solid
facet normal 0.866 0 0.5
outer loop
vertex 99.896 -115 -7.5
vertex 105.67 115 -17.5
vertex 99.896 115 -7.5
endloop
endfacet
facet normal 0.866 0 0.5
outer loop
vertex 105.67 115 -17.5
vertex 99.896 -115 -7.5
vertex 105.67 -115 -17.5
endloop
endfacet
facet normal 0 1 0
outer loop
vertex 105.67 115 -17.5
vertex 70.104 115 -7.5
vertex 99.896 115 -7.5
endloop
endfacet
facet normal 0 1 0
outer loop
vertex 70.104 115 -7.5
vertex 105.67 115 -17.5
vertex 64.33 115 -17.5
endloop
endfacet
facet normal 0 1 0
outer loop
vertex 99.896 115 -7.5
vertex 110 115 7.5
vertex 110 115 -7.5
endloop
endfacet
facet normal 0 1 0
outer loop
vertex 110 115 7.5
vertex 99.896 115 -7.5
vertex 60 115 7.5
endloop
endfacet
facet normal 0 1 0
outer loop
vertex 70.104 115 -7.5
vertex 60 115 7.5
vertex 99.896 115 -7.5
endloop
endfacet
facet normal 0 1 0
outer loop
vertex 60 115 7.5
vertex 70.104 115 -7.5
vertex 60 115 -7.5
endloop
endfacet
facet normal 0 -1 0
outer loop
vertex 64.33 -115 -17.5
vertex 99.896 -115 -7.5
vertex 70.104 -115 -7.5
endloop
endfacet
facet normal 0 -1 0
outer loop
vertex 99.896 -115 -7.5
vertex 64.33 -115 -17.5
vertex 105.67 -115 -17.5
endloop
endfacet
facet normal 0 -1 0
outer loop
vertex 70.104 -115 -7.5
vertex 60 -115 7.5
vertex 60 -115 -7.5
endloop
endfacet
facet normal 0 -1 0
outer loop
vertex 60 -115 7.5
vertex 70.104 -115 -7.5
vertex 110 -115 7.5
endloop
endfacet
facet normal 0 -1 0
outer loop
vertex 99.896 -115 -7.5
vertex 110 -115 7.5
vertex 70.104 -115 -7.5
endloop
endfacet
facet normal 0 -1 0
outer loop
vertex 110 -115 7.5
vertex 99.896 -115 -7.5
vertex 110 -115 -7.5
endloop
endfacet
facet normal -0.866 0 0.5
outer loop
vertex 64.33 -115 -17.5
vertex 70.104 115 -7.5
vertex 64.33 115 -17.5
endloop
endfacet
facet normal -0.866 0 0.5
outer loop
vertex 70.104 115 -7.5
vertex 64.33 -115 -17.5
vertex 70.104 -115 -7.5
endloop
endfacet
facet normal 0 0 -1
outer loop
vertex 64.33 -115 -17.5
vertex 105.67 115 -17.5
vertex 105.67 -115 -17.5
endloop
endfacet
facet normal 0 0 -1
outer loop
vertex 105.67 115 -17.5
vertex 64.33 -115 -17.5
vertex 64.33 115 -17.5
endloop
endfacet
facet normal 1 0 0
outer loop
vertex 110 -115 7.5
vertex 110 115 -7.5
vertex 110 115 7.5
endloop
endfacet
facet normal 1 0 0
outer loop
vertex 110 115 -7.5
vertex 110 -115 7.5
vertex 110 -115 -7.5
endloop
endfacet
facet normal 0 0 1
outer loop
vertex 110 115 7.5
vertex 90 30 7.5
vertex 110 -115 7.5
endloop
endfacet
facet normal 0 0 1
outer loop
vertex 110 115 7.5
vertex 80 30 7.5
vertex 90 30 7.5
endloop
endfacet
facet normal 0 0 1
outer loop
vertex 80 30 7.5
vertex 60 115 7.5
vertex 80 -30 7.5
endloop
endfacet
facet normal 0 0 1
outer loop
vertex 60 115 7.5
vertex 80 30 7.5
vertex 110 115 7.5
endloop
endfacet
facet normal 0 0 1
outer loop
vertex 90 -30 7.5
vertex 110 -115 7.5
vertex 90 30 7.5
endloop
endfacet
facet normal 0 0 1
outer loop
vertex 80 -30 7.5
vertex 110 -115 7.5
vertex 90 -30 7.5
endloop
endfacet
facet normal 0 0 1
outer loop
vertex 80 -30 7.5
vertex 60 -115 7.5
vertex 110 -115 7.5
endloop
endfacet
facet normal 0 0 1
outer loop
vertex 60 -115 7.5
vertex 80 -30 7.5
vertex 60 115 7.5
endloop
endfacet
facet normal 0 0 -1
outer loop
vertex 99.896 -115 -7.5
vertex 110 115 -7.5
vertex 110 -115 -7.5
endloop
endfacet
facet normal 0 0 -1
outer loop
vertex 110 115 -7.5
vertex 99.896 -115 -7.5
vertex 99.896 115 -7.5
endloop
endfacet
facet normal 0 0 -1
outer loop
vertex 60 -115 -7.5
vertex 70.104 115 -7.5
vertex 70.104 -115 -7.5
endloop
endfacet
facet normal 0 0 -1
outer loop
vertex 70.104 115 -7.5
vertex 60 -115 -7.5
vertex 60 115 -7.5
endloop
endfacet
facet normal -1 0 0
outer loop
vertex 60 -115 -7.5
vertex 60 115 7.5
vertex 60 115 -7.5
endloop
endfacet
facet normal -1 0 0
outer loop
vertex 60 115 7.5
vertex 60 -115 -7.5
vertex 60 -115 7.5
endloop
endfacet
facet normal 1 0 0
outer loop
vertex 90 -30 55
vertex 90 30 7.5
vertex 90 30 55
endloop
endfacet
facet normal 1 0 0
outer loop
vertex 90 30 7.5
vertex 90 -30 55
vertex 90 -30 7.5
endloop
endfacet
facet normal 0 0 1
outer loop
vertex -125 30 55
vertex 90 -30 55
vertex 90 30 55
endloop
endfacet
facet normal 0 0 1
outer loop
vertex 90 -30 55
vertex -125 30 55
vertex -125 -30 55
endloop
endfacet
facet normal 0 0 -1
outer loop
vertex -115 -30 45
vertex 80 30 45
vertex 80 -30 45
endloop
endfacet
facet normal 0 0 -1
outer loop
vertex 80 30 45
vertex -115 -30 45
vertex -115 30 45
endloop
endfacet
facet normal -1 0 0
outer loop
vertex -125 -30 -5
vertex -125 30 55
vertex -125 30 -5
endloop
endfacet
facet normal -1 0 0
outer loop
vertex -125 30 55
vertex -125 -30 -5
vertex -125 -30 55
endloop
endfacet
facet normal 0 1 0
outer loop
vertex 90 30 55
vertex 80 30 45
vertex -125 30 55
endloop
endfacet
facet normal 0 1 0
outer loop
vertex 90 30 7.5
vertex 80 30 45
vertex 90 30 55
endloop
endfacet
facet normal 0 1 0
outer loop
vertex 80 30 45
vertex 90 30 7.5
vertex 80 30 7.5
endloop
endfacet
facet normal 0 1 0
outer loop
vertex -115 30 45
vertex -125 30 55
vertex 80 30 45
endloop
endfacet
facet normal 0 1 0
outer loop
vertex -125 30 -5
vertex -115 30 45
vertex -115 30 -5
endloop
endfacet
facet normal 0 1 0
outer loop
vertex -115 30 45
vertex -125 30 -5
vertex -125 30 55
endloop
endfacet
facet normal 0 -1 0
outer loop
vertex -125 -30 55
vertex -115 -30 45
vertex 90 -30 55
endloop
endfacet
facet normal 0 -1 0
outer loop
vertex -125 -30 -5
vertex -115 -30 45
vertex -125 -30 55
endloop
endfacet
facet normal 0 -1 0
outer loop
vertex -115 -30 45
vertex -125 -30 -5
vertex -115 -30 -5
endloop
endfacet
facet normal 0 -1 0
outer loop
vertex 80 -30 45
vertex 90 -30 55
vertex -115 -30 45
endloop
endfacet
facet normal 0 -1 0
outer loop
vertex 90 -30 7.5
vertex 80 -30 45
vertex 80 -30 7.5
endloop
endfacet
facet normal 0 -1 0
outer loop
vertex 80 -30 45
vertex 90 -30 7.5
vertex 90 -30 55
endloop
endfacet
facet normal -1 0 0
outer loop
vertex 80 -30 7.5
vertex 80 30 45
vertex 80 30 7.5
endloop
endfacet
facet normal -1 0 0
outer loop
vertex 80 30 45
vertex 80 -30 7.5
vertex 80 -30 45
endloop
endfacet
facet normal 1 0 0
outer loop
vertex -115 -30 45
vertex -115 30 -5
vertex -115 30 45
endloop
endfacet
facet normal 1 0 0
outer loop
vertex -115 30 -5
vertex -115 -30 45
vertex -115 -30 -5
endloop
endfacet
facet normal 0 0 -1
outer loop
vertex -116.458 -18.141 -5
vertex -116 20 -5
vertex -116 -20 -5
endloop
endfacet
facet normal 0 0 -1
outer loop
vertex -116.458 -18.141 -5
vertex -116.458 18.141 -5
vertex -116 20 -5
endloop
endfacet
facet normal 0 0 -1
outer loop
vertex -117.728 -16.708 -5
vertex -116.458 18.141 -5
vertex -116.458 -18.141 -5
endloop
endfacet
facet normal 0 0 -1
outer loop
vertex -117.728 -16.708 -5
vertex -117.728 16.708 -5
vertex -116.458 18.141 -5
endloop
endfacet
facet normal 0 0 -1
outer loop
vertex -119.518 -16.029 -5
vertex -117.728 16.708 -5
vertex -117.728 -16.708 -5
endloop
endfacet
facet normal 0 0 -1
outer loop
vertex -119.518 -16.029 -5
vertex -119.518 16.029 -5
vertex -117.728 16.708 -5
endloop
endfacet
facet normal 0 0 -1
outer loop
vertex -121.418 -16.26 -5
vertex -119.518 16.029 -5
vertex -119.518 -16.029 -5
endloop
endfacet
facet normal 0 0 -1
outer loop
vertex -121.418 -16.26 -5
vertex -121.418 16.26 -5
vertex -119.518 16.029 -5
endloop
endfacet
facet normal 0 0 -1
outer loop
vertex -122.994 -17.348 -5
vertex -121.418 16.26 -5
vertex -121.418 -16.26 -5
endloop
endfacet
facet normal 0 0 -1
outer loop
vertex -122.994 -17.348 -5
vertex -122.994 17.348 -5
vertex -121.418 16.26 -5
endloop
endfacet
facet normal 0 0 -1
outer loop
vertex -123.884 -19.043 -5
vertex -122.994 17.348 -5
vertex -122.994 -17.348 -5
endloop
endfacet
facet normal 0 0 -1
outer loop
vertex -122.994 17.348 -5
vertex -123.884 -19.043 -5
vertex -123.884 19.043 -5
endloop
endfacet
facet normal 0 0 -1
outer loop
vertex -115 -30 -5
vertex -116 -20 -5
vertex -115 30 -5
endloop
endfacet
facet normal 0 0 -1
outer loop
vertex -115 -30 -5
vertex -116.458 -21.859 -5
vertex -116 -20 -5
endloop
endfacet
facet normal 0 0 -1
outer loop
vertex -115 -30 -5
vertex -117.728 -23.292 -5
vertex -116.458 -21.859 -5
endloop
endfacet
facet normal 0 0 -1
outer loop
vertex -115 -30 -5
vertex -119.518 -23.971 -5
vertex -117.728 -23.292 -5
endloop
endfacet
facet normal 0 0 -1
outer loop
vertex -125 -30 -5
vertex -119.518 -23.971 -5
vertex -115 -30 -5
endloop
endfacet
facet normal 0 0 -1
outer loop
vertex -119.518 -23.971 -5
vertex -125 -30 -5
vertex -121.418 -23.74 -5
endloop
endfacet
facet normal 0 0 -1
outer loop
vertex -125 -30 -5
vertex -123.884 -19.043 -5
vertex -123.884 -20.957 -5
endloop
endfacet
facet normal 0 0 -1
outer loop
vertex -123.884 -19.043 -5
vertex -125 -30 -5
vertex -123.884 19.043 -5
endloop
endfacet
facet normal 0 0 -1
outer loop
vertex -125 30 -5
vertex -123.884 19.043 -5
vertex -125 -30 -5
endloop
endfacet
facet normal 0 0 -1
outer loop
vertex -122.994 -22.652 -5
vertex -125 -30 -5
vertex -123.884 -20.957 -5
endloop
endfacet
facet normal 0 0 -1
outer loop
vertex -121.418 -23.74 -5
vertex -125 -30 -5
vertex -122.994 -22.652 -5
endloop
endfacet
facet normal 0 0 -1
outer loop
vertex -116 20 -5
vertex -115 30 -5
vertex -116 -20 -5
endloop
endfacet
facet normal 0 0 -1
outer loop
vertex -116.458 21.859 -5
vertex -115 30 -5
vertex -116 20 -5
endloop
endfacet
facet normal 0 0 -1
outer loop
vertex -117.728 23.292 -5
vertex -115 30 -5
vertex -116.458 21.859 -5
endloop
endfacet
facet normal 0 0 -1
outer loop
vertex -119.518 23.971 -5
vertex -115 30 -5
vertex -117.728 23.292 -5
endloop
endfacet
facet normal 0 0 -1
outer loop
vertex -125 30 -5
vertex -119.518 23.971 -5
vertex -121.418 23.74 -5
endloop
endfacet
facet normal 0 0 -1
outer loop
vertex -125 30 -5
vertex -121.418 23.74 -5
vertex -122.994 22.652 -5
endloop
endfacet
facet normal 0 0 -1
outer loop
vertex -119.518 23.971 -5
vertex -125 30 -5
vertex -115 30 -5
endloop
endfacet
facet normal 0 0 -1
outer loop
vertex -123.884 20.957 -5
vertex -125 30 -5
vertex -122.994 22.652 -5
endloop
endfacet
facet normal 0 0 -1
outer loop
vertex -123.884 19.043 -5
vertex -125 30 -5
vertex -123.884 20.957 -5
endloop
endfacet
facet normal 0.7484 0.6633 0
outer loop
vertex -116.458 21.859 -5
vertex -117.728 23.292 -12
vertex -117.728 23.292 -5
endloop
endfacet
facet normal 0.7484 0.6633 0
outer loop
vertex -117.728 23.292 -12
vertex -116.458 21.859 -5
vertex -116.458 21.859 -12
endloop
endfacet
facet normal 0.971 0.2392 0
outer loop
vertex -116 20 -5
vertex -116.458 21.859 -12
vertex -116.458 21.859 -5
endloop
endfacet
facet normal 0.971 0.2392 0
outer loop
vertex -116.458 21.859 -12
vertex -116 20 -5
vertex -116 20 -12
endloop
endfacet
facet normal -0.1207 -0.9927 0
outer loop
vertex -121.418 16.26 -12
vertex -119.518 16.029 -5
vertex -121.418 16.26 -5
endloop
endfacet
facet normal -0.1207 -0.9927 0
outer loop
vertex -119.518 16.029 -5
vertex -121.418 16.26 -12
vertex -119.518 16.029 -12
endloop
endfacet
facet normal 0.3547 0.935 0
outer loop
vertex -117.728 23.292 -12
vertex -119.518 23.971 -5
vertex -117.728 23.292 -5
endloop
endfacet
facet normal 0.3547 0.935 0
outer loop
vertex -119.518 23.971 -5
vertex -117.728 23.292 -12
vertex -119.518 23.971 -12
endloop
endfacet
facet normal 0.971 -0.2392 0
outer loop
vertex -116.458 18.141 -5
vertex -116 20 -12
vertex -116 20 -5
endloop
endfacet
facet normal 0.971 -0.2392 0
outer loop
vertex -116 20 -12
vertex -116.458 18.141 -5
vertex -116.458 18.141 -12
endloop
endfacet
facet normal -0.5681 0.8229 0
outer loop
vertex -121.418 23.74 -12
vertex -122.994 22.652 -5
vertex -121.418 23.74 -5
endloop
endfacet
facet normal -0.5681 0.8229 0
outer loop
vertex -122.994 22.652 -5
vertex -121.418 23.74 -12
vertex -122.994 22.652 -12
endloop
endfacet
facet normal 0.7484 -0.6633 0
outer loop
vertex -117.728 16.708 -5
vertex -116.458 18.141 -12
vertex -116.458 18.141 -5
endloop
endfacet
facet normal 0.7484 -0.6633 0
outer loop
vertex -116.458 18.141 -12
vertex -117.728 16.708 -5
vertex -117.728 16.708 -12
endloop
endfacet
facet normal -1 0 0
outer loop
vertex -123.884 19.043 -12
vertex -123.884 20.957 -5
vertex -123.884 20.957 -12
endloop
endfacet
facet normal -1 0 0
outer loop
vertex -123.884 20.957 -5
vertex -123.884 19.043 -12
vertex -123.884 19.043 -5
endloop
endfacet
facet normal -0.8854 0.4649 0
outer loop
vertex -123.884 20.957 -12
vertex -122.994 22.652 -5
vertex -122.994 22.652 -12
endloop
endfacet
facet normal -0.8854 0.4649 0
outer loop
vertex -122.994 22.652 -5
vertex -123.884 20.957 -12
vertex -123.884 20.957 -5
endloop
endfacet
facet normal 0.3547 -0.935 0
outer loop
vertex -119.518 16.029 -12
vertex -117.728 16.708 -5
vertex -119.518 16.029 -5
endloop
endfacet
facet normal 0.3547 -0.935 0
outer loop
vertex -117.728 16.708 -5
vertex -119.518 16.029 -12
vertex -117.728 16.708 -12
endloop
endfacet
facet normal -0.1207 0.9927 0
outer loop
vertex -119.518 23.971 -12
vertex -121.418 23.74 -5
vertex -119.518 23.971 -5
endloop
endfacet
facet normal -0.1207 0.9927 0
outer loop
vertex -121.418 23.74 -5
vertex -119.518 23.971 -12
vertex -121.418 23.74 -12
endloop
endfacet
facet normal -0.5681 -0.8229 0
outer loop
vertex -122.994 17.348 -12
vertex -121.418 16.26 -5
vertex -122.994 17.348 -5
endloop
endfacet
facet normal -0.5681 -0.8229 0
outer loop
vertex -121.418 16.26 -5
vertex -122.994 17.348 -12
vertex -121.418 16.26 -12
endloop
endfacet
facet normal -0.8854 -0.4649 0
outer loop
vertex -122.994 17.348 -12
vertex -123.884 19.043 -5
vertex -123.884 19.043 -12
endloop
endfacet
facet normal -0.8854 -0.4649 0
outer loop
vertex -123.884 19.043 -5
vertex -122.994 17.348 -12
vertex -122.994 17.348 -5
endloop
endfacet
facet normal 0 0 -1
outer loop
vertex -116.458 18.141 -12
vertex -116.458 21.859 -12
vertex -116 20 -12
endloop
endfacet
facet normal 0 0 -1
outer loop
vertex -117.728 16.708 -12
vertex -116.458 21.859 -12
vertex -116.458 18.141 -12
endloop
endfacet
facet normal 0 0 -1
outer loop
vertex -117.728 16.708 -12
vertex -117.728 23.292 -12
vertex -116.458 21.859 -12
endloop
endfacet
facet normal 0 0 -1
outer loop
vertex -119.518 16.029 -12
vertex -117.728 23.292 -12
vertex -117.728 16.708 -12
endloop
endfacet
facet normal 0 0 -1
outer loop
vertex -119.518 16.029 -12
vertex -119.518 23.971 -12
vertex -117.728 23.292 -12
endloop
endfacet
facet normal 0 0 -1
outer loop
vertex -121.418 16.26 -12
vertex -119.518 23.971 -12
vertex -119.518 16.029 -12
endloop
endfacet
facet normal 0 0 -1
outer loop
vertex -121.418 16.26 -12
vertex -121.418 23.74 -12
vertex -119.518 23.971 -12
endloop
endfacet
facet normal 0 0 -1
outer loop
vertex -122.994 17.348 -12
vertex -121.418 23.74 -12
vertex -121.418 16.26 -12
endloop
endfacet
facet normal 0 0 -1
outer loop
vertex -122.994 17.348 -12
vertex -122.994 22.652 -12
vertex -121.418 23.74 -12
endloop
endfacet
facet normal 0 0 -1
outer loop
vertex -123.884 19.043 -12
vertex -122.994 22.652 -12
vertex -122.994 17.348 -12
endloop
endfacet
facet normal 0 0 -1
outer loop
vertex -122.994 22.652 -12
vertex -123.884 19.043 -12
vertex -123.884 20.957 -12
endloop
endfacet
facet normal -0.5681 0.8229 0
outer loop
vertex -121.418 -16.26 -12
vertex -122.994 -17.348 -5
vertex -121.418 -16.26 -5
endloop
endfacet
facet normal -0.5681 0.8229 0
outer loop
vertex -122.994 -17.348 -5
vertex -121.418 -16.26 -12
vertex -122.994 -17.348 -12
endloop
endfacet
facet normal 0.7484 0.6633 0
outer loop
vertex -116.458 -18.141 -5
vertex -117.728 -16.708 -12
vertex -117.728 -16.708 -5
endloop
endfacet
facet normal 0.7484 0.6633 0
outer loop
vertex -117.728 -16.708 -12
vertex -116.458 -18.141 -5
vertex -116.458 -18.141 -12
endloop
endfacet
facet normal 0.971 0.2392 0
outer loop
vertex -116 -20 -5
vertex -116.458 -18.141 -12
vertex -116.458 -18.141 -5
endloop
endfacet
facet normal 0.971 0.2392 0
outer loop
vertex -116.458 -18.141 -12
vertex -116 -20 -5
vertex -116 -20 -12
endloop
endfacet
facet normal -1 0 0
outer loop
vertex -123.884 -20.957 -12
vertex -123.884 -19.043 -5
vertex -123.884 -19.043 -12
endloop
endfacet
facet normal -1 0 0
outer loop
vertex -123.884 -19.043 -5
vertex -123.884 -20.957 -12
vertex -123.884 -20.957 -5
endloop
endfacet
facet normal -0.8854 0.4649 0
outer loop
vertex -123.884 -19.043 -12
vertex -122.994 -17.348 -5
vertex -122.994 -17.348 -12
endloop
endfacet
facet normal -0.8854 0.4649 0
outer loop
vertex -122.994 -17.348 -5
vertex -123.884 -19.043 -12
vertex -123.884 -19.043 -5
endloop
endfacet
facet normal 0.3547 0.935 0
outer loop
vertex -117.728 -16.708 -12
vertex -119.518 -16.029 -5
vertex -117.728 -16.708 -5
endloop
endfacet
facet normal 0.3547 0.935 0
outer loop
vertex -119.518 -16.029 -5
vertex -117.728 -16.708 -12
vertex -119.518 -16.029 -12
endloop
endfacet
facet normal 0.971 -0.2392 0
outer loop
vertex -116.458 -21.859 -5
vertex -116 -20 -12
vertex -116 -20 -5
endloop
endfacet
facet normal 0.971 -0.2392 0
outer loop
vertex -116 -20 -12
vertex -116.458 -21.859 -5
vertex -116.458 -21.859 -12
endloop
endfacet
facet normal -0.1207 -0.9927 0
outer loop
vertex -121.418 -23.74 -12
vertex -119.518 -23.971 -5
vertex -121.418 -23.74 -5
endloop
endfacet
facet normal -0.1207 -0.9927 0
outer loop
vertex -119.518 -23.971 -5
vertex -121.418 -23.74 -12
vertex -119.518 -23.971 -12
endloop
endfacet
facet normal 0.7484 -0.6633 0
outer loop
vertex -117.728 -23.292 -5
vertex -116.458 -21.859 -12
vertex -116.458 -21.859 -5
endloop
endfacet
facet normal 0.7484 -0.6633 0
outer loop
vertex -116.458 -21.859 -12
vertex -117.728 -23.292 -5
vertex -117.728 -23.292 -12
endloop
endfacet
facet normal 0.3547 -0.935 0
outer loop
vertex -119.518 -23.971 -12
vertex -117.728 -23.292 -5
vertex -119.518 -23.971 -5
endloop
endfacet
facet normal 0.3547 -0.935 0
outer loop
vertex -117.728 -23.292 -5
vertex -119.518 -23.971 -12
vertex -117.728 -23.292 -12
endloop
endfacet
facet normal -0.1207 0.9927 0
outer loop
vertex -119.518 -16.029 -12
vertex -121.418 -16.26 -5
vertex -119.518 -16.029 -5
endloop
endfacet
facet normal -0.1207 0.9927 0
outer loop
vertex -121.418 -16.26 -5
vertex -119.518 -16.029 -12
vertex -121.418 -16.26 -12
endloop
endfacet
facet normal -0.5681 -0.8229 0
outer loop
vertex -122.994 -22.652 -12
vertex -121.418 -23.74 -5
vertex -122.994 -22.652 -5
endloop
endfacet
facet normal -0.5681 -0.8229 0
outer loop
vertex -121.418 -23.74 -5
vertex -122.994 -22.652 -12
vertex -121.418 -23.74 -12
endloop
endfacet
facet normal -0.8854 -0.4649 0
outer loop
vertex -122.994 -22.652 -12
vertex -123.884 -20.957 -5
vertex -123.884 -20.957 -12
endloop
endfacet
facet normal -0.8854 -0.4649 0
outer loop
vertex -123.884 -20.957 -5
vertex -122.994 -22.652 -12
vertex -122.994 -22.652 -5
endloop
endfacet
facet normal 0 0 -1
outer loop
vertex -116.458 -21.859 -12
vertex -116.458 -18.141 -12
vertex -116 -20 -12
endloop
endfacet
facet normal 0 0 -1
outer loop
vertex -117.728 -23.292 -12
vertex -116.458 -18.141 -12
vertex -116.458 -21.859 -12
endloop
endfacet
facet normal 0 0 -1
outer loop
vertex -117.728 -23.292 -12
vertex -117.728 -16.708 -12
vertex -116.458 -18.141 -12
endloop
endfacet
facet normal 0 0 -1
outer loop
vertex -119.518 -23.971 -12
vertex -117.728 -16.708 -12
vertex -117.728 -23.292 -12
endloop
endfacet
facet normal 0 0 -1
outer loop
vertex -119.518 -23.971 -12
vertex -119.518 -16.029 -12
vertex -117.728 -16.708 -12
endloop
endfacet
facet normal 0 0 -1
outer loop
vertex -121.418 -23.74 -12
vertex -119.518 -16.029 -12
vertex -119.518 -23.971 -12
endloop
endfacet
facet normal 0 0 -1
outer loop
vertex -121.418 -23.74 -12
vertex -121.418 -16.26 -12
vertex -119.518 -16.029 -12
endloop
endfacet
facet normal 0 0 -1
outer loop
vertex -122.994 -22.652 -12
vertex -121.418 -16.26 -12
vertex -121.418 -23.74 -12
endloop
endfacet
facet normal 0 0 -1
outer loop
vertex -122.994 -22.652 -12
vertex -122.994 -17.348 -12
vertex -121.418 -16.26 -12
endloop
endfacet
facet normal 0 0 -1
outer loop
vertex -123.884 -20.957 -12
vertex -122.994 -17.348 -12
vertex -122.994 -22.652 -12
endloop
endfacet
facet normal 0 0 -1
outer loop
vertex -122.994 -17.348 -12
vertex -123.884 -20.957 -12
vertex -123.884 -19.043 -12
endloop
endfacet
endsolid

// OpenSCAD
module handle(){
    handlebase();
    handletop();
}
module handlebase(){
    difference(){
        union(){
//            translate([-120,0,-10]){
//                cube([10, 230, 10],center = true);
//            }
            translate([85,-0,0]){
                cube([50, 230, 15], center = true);
                handlebaseslide();
            }
        }
        handletop();
    
    }

}
module handletop(){

        union(){
            translate([-17.5,0,50]){
                cube([215, 60, 10],center = true);
            }
            translate([85,0,25]){
                #cube([10,60,40],center = true);
            }
            translate([-120,0,25]){
                cube([10,60,60],center = true);
            }
            translate([85,-20,4]){
                cylinder(8, d = 8, center = true);
            }
            translate([85,20,4]){
                cylinder(8, d = 8, center = true);
            }   
            translate([-120, 20,-8]){
                cylinder(8, d = 8, center = true);
            }
            translate([-120, -20, -8]){
                cylinder(8, d = 8, center = true);
            }               
        }

}
module handlebaseslide(){
    difference(){
        translate([0, 0, -25]){
            rotate([90,90,0]){
                rotate([0,0,30]){
                    cylinder(230, d = 50, center = true, $fn = 6);
                }
            }
        }
        translate([0,0,-35]){
            cube([50,231, 35], center = true);
        }
    }
}
handle();
